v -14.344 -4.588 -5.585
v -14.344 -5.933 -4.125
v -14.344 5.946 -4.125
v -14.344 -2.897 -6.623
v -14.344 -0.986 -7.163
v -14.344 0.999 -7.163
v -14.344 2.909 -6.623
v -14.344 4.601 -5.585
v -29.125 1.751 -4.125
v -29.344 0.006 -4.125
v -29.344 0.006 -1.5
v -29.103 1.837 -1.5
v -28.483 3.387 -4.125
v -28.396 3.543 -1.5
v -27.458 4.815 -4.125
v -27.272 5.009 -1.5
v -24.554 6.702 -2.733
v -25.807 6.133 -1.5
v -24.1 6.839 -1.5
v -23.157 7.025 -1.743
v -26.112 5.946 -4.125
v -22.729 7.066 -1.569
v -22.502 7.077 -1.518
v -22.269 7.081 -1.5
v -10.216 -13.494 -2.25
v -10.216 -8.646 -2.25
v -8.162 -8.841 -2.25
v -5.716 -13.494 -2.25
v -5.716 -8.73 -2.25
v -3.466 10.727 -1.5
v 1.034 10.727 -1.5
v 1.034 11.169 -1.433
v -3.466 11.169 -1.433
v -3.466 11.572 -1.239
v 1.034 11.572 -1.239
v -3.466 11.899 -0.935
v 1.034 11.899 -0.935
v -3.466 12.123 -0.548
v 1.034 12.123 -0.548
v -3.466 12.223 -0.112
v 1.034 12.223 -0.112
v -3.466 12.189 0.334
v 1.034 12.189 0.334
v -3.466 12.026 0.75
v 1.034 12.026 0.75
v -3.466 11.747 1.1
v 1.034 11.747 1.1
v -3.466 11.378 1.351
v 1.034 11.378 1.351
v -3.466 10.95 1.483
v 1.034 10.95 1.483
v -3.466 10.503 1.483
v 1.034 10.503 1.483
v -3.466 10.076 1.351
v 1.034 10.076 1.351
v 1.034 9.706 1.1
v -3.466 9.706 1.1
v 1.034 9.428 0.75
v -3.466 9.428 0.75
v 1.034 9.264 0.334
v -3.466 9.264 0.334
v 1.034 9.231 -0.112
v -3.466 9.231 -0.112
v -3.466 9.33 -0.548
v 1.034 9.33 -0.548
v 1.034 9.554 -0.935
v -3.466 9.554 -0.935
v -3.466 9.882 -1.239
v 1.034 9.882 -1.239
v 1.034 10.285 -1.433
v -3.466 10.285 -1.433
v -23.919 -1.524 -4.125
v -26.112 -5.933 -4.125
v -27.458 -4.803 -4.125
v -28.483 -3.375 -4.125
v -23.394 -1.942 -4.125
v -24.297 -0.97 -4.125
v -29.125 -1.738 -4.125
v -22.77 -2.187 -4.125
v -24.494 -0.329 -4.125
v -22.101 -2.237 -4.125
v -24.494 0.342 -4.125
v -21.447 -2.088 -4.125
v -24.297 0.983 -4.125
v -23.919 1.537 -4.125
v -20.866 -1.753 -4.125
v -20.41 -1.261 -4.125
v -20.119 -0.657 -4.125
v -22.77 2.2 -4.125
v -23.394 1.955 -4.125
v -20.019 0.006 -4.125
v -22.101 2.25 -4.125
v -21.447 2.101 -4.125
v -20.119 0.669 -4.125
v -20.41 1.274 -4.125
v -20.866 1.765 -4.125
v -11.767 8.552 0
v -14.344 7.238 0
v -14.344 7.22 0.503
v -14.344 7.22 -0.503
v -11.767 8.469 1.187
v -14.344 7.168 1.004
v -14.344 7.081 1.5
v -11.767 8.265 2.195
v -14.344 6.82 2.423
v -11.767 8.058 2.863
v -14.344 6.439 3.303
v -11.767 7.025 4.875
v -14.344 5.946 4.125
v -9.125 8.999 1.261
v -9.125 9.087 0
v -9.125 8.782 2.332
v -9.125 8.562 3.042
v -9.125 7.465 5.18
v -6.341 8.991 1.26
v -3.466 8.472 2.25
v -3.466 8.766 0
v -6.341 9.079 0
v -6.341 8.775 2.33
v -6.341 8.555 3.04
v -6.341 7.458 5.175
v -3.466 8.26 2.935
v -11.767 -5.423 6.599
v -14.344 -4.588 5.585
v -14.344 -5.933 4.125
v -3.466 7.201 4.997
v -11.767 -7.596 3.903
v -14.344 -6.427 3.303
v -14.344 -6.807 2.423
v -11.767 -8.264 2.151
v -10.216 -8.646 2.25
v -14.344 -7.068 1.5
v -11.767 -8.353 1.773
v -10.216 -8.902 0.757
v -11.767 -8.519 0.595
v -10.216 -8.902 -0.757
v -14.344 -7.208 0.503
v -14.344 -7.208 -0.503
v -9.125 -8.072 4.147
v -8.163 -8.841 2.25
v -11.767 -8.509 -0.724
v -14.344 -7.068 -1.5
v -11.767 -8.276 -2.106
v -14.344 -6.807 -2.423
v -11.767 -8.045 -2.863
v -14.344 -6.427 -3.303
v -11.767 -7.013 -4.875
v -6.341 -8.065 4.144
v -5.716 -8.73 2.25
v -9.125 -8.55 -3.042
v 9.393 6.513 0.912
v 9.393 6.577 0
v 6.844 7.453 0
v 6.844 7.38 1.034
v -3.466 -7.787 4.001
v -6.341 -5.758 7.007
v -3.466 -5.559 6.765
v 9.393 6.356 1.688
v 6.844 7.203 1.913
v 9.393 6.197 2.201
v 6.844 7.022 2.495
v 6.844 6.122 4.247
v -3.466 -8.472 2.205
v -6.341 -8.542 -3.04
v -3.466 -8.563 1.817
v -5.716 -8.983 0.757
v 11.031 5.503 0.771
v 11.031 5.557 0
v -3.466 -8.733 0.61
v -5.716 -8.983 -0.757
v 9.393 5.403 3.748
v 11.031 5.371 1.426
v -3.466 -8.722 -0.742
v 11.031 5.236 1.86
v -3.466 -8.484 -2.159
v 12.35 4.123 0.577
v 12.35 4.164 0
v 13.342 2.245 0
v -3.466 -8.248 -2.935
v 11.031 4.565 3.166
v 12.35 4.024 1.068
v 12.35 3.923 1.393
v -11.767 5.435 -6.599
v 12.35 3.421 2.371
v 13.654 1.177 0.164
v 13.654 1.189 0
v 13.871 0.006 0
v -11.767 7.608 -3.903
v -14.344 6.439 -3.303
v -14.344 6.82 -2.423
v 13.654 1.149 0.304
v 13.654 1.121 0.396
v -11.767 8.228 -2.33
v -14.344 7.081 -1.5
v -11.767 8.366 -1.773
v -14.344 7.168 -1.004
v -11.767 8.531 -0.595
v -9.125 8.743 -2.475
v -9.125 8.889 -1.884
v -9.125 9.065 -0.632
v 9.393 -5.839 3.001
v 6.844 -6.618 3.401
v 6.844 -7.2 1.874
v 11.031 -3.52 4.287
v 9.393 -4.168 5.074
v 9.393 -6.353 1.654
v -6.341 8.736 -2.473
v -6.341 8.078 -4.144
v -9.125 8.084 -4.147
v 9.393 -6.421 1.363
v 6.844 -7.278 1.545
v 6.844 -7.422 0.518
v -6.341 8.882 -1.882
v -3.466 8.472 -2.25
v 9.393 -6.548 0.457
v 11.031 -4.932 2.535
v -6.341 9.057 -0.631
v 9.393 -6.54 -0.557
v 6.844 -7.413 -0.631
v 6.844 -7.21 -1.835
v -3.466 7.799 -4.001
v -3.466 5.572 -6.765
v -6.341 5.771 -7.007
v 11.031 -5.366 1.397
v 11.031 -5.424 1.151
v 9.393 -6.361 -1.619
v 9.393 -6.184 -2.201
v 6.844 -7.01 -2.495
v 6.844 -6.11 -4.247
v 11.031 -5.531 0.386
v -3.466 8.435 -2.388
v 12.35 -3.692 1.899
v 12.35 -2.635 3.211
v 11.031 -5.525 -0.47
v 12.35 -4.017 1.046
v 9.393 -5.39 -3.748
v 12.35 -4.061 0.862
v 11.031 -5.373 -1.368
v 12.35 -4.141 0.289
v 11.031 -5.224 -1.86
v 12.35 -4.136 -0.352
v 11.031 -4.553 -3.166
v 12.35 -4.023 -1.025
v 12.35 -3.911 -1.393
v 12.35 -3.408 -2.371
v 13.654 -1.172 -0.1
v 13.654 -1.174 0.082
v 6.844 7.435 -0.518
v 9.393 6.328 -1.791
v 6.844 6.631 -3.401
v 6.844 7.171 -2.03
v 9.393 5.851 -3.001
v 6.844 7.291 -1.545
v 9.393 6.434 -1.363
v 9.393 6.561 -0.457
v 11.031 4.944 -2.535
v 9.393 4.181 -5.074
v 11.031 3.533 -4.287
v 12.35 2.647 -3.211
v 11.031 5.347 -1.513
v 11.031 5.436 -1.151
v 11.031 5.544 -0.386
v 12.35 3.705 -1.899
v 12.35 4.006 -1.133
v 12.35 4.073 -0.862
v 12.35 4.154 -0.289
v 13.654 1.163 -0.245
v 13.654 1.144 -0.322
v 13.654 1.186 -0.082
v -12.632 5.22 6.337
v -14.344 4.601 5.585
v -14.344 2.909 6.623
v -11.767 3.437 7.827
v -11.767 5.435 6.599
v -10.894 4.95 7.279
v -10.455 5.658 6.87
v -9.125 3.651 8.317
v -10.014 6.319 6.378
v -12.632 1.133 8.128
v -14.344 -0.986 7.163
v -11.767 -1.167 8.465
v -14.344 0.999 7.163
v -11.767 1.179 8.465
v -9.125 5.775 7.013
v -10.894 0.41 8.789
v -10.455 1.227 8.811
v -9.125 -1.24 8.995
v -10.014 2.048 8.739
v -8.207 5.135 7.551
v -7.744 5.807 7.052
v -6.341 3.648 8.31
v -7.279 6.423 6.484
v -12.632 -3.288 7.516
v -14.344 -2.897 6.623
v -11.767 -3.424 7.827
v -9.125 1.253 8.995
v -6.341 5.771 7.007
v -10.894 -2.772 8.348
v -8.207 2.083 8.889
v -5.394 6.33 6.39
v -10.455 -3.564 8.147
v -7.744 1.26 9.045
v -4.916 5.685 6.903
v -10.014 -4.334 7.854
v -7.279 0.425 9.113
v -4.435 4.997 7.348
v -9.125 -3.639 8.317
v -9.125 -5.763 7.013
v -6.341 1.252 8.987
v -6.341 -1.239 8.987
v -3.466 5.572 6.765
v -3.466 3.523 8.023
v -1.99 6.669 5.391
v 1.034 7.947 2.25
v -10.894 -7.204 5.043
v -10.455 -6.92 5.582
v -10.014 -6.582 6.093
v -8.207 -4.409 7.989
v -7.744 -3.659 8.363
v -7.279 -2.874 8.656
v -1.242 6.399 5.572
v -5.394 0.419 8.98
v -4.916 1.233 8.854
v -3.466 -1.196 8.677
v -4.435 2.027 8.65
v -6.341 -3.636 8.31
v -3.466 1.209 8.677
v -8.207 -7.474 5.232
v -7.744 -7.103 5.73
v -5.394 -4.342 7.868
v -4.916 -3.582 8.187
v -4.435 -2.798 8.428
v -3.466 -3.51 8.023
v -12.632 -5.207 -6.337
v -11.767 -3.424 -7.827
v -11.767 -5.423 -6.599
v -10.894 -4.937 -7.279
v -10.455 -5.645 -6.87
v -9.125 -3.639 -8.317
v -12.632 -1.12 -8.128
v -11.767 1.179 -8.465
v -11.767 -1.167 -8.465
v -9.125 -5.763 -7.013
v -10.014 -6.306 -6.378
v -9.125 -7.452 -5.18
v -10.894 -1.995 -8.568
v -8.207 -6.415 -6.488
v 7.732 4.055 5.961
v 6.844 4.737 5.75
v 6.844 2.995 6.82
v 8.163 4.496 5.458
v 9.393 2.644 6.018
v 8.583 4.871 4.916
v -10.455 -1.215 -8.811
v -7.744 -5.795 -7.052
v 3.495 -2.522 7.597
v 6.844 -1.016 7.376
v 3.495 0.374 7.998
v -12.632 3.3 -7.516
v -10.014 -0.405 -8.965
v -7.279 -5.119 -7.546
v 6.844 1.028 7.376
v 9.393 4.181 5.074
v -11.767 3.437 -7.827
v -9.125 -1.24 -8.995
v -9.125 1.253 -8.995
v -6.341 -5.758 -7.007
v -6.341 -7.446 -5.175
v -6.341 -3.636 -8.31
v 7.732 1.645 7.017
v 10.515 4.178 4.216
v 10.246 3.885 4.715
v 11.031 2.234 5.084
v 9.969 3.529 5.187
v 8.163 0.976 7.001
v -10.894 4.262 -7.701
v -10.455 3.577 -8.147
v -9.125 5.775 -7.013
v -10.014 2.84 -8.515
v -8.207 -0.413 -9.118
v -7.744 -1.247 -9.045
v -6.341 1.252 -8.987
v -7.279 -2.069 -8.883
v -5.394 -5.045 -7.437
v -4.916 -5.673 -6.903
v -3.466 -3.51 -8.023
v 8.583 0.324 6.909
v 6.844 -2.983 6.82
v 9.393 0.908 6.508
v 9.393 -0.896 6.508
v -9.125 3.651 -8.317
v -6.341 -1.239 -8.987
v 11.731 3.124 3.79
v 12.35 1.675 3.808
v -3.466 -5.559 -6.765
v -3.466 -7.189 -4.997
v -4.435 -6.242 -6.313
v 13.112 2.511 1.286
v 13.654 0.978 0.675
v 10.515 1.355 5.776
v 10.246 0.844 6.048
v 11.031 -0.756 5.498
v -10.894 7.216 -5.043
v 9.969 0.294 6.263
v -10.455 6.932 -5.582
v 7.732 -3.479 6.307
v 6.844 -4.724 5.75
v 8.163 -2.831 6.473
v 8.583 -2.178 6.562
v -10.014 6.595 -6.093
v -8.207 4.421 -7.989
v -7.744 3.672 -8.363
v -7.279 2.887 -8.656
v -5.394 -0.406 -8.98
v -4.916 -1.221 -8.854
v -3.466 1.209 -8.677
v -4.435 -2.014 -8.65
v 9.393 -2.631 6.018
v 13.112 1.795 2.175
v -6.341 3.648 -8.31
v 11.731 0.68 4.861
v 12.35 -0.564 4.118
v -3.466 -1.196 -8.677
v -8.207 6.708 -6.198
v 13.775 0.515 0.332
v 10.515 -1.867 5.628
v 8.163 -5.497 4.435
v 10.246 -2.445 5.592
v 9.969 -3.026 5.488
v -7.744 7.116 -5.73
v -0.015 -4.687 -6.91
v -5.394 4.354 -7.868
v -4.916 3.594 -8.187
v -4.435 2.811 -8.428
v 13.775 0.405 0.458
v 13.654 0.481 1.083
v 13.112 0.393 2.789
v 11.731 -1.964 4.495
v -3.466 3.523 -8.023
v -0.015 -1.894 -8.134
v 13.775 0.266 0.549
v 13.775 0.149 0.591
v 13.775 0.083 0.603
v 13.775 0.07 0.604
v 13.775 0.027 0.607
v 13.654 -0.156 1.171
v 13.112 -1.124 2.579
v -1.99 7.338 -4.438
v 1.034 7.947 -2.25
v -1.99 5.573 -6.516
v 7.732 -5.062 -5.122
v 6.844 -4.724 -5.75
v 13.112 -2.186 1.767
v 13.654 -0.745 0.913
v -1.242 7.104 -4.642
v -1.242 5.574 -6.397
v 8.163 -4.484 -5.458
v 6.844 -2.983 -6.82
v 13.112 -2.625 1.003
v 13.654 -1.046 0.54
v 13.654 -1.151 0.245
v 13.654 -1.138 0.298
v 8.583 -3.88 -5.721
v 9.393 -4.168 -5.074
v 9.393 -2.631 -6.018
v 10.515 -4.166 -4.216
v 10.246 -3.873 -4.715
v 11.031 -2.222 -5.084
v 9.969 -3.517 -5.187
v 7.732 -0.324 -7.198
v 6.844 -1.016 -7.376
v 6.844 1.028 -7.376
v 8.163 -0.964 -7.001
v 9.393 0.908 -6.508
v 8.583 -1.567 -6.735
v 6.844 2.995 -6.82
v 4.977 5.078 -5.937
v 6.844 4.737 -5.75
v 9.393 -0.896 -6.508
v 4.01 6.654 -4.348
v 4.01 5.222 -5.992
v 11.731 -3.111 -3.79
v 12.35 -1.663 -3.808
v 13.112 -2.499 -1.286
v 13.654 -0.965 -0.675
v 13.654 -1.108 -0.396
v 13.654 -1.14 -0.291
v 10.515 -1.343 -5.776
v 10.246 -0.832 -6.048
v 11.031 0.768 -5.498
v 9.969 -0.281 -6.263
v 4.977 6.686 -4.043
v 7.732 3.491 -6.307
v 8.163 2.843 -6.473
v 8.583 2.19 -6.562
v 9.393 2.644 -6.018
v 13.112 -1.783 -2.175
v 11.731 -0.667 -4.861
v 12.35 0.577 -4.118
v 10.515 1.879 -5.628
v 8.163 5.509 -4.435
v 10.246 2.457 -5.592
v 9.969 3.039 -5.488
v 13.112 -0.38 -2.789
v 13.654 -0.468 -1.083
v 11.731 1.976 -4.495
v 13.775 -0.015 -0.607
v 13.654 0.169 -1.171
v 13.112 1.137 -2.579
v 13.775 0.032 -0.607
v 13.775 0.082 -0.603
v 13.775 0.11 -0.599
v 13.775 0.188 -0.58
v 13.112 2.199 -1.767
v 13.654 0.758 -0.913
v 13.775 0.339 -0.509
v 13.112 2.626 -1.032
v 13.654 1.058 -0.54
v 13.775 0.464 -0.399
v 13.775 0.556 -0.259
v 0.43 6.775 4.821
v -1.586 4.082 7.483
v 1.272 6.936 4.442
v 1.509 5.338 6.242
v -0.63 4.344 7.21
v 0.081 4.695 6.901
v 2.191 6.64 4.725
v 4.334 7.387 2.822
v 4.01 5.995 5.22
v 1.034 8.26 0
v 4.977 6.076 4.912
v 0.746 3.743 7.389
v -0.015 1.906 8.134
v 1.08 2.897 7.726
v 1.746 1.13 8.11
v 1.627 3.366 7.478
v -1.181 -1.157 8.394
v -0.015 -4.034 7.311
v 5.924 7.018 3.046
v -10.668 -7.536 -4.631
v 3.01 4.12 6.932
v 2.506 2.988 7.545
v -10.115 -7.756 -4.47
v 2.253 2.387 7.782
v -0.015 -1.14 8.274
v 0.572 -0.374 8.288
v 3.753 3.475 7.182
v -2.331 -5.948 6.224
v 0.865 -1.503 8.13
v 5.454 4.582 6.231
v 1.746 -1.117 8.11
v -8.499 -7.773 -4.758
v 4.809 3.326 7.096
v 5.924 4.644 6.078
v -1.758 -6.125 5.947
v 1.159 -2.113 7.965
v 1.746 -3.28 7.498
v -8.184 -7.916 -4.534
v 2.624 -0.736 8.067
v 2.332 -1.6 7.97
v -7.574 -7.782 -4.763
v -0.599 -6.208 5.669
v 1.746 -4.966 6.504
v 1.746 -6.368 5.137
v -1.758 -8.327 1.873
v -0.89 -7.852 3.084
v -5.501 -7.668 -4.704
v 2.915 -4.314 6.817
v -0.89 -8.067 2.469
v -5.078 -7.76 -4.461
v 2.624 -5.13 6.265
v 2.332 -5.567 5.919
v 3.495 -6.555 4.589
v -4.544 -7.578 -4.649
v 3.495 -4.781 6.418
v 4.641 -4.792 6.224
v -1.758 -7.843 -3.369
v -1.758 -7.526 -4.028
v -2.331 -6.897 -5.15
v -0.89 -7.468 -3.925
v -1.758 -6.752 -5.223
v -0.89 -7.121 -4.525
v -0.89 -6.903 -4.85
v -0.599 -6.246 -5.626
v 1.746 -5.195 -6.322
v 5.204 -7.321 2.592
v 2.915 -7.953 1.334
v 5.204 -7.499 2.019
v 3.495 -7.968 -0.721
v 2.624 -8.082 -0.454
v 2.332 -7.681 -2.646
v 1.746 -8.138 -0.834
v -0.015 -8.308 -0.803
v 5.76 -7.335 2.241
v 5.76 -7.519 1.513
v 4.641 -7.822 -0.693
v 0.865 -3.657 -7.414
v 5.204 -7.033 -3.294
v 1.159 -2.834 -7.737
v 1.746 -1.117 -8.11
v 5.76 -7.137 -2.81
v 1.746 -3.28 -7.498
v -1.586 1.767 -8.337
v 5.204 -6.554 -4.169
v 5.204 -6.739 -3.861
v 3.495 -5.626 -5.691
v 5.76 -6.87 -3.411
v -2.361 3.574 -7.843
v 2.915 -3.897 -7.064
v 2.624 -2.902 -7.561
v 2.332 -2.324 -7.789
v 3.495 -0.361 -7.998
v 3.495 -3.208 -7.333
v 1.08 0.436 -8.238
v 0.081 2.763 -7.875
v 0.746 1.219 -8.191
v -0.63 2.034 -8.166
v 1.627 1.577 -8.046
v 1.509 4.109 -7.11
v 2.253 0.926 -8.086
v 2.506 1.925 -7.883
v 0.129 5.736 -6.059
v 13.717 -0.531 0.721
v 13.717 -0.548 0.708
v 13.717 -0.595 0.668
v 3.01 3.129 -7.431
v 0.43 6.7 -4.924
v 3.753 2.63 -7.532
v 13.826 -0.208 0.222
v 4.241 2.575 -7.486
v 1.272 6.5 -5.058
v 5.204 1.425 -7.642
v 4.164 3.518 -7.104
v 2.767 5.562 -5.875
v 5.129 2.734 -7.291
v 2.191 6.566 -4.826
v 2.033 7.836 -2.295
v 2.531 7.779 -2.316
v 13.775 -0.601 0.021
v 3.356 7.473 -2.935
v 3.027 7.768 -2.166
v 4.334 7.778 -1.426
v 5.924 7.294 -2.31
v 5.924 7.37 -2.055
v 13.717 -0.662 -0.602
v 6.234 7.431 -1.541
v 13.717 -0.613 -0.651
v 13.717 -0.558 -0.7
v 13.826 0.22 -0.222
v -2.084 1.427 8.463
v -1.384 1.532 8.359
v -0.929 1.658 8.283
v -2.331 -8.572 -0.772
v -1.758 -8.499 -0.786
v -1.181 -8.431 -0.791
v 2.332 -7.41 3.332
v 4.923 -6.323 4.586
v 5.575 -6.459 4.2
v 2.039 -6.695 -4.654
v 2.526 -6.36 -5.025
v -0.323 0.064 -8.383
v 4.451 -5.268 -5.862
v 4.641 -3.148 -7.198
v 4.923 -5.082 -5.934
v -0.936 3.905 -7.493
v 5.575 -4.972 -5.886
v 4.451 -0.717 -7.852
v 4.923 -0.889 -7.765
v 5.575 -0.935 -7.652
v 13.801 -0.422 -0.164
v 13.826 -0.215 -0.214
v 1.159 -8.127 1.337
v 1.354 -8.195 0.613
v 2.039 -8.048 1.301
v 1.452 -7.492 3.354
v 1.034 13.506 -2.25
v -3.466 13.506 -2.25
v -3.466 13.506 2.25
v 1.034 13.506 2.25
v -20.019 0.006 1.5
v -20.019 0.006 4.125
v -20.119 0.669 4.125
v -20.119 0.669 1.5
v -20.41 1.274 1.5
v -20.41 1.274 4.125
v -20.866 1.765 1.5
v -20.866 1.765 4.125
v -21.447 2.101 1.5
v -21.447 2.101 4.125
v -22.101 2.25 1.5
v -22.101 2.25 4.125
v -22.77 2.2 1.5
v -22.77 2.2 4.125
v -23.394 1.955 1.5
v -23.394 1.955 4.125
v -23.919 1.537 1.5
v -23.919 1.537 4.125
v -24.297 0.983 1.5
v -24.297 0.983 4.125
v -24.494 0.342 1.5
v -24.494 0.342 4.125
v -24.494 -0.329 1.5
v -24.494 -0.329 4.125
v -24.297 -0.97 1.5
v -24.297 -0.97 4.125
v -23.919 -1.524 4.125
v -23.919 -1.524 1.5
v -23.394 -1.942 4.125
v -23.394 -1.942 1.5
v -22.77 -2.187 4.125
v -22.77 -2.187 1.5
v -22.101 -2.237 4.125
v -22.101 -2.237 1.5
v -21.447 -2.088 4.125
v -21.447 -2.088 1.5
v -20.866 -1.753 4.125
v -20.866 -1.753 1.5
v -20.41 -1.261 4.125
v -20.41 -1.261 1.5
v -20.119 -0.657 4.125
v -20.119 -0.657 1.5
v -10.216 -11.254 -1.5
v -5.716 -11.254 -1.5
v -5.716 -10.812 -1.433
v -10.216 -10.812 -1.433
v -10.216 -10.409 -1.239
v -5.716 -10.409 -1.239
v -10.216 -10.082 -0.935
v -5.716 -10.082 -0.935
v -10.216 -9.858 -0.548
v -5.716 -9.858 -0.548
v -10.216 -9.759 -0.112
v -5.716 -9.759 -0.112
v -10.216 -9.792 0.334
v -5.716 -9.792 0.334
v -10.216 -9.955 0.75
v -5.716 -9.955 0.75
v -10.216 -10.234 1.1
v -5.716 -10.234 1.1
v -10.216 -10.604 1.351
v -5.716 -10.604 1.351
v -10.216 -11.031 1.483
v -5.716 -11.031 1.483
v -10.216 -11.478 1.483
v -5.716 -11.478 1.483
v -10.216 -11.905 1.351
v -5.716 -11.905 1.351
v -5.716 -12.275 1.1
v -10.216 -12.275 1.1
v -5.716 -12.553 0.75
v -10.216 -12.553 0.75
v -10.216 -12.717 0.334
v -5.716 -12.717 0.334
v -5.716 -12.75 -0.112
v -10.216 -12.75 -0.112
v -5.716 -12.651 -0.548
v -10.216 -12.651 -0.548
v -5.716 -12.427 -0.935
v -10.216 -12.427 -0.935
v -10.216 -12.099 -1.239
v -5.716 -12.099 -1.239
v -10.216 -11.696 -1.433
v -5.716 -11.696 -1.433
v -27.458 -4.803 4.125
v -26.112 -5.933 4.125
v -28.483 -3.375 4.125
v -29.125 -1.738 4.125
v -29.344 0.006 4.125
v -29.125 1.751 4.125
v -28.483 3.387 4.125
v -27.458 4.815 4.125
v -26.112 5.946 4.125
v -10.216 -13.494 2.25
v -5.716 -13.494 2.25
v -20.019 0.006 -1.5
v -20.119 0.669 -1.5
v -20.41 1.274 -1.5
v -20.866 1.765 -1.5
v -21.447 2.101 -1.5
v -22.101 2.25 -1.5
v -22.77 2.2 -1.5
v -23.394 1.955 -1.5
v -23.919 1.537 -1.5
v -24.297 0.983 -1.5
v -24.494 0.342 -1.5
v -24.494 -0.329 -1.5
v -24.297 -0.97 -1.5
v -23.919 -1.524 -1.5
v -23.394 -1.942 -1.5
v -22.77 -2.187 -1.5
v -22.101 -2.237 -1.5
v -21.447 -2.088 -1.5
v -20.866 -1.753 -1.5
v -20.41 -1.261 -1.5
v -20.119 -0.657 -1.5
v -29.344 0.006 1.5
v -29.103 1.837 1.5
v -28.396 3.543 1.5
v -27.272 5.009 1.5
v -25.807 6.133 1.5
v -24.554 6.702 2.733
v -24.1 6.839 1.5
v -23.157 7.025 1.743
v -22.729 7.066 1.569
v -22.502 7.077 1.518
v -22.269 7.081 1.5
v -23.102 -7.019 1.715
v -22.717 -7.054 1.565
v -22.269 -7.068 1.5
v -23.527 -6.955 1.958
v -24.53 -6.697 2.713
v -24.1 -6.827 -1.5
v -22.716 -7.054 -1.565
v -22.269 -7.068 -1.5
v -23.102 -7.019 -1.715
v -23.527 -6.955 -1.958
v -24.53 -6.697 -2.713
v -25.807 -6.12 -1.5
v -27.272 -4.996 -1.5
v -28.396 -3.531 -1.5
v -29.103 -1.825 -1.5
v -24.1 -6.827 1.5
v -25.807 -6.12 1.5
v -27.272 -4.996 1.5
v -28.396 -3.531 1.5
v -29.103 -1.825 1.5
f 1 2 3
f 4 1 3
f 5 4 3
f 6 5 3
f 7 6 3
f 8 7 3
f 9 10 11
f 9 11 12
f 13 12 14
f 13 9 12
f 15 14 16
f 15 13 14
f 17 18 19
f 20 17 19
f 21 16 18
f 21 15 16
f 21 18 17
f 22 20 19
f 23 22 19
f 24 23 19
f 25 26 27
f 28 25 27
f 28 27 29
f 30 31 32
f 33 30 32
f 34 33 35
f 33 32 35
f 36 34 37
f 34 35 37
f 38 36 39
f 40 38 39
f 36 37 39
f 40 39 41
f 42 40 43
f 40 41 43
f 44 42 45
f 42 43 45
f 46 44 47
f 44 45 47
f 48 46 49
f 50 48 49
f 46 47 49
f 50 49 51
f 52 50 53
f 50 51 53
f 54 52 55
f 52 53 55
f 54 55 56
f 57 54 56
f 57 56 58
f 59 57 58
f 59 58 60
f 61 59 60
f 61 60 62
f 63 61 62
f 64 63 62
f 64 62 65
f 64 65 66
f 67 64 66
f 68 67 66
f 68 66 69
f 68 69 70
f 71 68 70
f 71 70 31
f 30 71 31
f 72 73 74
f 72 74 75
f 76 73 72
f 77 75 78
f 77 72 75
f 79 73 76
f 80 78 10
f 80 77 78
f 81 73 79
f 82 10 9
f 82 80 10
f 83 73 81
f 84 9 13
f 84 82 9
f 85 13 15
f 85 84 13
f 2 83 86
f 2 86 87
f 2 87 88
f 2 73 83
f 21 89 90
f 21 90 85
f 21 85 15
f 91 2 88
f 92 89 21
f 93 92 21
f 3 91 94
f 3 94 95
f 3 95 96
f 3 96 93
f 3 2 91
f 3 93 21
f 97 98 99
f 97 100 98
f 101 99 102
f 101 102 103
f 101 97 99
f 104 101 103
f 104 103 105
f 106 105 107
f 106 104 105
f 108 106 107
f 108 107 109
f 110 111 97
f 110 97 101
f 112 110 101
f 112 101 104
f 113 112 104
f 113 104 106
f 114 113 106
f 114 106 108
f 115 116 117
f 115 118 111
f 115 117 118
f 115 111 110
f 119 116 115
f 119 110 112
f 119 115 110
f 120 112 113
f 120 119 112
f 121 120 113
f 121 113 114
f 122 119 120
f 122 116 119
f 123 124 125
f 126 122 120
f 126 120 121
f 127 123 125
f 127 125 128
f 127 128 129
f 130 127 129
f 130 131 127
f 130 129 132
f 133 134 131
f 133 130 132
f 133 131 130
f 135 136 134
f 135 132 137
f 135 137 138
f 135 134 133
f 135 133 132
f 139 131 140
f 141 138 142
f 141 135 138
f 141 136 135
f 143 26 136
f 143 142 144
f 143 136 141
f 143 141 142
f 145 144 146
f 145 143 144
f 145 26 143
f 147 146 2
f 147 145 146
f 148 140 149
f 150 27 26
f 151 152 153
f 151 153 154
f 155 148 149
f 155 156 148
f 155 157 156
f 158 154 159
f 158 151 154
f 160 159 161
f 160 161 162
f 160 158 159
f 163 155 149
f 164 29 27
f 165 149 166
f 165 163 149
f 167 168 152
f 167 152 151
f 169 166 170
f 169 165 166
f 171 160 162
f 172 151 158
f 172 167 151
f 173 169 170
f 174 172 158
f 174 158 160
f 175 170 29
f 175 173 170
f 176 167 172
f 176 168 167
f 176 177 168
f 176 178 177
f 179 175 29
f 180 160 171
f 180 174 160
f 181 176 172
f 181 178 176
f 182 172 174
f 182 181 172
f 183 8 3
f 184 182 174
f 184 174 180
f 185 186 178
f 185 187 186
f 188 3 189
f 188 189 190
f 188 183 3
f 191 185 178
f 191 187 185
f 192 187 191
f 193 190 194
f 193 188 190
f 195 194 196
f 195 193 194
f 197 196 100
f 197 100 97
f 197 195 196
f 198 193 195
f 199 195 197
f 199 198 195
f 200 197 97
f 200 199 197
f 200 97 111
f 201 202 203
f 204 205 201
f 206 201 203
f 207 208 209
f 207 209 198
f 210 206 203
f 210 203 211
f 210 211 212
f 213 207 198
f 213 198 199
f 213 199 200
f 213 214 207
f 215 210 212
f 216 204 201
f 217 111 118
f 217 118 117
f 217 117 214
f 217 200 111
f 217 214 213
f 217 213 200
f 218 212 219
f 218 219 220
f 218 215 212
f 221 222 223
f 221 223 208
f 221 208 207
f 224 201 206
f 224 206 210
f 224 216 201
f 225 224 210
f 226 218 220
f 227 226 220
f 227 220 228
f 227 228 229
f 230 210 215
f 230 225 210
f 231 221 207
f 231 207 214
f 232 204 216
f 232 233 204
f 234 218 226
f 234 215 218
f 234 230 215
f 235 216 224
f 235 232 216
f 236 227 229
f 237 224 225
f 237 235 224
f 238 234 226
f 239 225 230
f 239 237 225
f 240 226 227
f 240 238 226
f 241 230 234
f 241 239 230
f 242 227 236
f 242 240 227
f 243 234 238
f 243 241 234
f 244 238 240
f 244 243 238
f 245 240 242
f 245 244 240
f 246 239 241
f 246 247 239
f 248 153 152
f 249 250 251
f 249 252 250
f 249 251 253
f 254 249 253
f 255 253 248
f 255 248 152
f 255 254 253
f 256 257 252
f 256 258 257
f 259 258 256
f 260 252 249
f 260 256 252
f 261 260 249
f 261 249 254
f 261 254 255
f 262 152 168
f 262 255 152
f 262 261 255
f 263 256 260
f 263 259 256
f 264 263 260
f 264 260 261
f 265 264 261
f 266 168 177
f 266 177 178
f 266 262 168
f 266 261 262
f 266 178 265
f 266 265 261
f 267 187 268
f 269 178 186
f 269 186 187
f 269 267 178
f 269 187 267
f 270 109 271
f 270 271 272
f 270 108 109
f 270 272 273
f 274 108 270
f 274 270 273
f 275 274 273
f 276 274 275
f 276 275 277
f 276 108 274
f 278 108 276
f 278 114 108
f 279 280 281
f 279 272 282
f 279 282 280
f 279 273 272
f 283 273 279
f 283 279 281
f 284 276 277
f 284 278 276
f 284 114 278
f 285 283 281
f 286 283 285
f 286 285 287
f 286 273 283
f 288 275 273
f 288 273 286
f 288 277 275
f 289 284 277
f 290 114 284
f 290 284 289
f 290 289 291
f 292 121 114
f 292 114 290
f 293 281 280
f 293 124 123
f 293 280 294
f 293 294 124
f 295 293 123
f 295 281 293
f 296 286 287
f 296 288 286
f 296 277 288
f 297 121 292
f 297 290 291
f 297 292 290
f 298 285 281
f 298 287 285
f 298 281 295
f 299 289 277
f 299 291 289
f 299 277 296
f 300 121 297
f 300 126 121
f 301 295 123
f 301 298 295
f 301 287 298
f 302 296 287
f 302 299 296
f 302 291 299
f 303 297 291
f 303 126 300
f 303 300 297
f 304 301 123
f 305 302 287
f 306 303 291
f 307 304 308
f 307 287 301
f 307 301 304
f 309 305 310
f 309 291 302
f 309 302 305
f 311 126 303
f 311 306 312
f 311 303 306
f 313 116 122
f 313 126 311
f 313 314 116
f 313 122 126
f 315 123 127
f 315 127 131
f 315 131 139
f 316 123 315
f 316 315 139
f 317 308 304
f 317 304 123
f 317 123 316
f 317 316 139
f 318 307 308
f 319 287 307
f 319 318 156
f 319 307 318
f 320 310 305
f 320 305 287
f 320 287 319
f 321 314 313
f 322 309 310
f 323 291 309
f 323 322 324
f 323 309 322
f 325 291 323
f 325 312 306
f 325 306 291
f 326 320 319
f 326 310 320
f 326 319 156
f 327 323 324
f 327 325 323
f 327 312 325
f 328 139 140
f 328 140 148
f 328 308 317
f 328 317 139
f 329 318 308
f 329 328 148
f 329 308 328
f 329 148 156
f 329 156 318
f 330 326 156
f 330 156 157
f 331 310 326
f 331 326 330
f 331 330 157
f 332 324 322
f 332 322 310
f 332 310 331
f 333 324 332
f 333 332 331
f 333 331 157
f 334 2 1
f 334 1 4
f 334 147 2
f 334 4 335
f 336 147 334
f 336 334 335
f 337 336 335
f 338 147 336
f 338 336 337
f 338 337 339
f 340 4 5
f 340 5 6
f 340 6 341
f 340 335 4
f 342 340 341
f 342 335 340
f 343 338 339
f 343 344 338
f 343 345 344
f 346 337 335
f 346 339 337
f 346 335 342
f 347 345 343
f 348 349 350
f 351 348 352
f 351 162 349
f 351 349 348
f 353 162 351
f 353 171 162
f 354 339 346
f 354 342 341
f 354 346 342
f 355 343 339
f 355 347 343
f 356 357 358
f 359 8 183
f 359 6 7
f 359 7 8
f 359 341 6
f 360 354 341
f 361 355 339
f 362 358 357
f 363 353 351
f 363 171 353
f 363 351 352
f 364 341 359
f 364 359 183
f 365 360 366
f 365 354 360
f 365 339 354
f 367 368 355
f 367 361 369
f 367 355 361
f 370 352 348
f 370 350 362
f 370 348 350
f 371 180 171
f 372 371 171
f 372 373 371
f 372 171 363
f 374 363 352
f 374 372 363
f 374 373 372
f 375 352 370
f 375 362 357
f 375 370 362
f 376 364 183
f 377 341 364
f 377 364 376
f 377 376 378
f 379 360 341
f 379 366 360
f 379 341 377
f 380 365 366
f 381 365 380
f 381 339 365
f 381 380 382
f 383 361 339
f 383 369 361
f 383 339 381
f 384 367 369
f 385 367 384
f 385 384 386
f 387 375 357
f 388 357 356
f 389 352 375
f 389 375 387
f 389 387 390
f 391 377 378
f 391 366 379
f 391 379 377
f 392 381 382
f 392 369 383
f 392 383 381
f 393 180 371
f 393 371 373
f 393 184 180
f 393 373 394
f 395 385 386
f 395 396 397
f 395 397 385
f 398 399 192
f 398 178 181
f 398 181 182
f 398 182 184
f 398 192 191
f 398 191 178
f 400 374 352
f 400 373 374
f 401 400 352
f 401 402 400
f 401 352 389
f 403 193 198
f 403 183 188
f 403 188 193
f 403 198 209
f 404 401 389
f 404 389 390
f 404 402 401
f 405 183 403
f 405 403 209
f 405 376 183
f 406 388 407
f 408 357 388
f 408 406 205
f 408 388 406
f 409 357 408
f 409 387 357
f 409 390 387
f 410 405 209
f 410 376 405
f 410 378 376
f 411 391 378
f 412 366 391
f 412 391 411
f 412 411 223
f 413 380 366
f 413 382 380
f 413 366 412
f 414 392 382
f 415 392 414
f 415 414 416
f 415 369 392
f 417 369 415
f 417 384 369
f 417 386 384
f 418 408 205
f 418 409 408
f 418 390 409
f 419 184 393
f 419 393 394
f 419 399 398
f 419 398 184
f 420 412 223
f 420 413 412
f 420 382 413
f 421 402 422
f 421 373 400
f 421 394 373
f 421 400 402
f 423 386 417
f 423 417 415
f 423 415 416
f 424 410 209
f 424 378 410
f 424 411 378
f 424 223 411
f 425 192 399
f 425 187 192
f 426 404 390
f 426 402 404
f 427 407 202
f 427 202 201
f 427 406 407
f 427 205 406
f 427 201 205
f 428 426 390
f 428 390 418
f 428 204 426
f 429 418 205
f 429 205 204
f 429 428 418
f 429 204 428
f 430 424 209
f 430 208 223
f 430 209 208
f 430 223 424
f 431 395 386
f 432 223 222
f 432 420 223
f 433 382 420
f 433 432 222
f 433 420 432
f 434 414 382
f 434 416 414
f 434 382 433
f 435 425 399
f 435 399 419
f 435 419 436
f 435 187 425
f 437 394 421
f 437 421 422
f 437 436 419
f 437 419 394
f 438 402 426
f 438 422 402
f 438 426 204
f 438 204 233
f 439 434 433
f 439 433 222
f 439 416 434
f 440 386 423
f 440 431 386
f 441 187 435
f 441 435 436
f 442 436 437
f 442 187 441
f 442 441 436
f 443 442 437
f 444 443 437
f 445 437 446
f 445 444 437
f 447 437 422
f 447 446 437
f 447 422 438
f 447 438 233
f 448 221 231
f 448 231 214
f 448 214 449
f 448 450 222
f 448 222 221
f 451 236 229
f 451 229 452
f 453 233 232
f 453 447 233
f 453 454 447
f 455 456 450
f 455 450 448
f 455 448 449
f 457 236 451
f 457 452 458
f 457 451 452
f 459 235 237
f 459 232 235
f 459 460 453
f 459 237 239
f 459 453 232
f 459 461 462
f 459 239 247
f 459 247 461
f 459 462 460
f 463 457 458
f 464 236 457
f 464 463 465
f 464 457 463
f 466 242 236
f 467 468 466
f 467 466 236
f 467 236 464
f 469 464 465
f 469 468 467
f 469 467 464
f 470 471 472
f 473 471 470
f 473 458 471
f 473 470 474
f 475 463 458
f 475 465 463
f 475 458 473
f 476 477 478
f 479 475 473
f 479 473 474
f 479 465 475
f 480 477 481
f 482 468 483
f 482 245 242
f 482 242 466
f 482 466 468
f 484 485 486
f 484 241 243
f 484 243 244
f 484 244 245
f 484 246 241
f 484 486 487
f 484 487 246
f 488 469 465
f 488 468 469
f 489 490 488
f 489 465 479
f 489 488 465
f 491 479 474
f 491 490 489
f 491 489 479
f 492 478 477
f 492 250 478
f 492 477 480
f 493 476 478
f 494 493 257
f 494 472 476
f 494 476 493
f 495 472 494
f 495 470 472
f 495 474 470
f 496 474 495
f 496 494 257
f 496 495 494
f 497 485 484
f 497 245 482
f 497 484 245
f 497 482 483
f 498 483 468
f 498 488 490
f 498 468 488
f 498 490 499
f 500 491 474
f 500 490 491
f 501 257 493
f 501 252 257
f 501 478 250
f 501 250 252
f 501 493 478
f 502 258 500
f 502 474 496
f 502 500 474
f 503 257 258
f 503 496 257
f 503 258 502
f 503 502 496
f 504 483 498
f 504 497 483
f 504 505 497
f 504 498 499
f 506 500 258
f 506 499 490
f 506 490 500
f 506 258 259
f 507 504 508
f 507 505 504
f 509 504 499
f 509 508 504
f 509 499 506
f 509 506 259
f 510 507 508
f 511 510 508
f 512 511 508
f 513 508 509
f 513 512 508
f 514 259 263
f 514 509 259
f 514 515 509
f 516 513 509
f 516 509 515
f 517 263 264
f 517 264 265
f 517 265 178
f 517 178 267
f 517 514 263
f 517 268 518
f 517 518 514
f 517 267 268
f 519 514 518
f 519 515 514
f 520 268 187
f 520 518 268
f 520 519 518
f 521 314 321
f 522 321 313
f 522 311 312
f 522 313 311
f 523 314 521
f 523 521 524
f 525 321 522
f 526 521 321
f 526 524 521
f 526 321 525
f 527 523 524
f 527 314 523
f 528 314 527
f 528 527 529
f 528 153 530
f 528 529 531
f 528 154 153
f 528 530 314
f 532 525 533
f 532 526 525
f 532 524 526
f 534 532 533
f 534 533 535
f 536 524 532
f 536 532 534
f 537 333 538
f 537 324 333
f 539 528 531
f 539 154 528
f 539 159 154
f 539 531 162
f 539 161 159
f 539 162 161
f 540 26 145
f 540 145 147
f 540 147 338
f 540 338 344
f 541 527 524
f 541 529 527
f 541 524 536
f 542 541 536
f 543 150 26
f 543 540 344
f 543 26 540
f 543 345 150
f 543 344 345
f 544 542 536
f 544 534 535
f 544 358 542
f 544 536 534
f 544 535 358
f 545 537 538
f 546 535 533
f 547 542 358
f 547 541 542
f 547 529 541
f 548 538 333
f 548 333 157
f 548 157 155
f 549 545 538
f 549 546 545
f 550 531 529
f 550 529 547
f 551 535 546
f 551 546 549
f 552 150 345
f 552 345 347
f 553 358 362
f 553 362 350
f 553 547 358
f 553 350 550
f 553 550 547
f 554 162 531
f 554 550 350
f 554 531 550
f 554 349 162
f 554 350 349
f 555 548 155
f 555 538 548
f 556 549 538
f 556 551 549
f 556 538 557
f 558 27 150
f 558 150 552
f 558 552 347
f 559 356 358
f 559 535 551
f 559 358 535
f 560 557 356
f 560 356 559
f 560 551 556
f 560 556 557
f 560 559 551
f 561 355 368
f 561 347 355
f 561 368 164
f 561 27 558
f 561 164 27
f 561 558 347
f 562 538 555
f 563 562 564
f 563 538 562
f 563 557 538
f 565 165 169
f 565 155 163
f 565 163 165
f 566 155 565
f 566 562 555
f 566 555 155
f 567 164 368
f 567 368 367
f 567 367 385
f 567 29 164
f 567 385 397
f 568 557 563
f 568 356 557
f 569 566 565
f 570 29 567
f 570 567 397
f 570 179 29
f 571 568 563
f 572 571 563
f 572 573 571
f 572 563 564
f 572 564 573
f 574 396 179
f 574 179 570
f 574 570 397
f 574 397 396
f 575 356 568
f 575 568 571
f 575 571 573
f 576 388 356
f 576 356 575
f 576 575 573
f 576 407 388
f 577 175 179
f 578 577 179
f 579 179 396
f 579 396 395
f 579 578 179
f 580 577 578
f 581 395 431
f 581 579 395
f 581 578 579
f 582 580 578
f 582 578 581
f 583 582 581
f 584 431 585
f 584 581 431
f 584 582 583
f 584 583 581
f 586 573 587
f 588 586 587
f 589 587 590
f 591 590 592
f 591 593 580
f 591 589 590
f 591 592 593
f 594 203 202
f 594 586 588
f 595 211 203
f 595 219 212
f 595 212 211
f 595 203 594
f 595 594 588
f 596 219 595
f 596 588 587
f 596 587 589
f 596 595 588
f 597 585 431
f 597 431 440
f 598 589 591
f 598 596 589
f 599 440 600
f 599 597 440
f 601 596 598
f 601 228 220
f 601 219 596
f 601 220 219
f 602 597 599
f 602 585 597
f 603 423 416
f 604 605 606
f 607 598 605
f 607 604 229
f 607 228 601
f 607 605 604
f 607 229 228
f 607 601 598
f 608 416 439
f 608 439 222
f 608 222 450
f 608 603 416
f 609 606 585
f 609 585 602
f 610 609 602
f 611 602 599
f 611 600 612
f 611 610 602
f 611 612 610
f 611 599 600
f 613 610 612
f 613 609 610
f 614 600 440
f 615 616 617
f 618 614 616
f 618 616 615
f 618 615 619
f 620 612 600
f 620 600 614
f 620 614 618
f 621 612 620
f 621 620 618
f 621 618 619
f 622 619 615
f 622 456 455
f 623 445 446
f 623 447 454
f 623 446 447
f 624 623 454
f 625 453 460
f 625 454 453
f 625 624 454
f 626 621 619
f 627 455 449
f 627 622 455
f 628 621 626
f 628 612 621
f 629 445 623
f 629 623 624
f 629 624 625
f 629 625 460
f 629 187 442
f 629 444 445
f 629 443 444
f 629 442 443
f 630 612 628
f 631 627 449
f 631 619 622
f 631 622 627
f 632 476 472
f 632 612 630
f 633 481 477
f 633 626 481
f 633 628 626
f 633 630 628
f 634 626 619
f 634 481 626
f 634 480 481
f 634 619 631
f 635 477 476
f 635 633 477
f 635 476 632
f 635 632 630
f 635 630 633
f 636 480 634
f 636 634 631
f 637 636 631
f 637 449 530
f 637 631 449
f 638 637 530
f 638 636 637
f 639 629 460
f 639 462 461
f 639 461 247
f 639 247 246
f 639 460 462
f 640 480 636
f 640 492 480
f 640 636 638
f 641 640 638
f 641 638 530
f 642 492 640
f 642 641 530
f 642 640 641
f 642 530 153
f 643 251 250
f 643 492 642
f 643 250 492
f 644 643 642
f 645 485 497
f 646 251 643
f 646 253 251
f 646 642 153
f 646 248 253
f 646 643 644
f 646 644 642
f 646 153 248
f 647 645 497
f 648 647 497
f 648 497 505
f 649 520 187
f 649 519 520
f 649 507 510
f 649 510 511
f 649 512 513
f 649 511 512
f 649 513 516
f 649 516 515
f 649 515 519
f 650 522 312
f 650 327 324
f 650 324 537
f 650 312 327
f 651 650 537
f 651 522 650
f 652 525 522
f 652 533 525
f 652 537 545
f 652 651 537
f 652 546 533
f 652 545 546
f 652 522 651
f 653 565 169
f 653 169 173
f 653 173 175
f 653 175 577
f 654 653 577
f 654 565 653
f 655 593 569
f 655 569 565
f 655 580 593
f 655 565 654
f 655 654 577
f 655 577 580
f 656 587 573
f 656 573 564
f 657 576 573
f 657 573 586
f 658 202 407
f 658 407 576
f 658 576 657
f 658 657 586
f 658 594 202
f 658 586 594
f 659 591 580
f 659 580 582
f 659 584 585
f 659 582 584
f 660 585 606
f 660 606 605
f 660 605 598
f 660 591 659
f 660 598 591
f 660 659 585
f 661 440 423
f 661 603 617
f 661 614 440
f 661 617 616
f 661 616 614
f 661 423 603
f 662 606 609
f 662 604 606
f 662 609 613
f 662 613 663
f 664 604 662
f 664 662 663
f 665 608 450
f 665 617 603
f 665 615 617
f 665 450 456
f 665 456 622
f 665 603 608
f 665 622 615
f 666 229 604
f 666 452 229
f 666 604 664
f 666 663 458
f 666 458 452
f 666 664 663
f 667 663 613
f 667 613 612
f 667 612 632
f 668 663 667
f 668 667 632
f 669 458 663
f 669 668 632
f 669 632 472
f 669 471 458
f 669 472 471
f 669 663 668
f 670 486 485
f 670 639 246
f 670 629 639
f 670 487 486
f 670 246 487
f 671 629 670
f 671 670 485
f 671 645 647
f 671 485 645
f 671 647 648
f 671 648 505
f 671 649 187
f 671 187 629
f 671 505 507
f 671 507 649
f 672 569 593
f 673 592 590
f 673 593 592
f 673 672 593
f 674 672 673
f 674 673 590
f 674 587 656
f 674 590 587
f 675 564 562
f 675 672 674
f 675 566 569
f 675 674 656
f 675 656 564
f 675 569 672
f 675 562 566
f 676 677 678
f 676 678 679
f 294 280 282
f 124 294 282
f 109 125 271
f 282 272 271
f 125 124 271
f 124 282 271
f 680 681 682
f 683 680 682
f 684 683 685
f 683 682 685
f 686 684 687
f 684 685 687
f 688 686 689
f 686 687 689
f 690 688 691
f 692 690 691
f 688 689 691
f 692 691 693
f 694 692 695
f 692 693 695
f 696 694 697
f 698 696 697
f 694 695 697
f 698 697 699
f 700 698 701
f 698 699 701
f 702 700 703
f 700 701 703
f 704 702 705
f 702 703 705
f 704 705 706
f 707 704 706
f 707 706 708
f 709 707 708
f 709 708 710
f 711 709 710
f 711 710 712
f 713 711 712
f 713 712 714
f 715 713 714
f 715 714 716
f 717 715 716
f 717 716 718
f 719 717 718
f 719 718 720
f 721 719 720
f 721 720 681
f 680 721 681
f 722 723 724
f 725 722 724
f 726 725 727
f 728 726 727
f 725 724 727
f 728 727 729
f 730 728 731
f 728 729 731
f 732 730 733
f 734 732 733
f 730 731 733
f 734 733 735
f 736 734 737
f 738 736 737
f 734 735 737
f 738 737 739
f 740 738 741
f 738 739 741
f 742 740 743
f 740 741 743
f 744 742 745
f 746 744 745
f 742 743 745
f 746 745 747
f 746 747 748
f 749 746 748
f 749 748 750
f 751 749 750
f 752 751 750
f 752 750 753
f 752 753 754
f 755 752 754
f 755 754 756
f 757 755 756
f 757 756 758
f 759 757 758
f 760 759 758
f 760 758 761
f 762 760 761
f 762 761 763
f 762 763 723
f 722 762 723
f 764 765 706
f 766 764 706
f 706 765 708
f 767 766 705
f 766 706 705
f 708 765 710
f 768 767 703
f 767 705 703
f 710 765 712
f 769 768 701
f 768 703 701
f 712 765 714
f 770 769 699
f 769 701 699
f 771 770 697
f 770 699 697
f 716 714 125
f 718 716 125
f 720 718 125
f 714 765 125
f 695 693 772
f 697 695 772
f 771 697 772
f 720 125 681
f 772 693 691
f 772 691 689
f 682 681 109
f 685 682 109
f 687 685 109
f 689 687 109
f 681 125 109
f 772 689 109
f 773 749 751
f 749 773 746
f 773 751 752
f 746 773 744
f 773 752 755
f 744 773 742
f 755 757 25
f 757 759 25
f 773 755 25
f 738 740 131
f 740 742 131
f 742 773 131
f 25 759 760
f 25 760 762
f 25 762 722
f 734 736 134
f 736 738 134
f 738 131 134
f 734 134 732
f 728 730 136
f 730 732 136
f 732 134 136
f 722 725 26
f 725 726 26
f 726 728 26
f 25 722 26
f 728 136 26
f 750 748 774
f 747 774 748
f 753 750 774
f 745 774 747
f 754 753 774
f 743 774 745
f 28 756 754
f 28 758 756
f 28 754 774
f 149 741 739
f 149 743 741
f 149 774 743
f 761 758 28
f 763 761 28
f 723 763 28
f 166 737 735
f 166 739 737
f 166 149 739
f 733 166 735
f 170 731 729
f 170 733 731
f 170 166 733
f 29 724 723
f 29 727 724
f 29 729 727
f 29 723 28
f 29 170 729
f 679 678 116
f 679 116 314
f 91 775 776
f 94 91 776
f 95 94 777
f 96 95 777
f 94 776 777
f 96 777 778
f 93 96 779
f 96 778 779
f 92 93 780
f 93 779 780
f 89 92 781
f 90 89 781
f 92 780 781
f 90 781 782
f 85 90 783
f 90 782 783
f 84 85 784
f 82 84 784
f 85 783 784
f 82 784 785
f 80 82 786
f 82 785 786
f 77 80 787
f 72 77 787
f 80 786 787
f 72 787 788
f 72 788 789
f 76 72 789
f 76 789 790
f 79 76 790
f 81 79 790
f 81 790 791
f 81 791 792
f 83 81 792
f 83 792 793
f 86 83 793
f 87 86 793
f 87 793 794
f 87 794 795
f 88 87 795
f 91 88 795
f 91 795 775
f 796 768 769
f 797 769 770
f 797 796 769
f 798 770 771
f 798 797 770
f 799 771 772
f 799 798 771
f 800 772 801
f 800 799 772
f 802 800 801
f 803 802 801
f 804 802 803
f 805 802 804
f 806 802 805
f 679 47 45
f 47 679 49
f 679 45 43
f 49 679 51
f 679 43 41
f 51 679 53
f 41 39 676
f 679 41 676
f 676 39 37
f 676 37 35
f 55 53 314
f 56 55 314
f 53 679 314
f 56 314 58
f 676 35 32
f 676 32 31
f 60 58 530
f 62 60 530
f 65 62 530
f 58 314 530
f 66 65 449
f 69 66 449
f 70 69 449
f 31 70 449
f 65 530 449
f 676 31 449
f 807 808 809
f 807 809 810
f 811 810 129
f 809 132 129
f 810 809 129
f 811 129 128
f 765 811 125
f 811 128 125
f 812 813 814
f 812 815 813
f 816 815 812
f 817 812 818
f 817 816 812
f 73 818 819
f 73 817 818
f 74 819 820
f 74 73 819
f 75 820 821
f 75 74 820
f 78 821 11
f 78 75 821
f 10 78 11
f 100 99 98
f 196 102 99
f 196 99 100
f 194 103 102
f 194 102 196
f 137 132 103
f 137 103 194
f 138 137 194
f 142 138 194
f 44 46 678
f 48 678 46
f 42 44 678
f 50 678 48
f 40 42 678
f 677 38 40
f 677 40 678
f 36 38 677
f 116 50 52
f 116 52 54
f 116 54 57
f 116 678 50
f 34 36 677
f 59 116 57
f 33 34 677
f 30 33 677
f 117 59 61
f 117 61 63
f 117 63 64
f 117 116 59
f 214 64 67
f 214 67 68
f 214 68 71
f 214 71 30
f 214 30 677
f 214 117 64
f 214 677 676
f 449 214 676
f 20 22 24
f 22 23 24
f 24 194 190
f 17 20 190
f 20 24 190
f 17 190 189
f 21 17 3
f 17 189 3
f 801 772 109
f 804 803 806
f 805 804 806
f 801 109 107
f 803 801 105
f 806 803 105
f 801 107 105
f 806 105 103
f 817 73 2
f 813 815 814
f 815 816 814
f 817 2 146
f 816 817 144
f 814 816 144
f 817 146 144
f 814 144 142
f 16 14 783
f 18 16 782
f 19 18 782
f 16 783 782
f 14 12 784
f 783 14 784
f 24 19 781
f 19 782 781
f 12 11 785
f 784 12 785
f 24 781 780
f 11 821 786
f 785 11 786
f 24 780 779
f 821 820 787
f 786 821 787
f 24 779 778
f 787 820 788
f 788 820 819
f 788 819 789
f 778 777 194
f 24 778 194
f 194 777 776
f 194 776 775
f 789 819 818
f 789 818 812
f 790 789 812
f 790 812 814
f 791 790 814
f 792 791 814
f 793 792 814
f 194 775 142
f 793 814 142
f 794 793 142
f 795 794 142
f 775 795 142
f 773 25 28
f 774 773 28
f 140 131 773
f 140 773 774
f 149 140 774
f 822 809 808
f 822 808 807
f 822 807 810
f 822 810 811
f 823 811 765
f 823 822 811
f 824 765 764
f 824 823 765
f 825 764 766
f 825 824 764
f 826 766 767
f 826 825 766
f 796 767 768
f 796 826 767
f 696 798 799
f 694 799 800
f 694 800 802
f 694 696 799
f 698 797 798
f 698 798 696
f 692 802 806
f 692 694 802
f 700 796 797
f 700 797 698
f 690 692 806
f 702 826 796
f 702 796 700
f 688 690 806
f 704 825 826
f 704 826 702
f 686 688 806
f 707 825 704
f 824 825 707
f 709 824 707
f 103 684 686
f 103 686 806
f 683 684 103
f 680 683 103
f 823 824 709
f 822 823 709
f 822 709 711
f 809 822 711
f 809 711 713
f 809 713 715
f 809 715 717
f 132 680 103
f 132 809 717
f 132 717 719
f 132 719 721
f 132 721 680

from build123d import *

# Parameters (mm, degrees)
SKETCH2_W               = 11
SKETCH2_H               = 20
BOSS_EXTRUDE1_DEPTH     = 20
SKETCH3_R               = 15
SKETCH3_R_2             = 9.642090149
CUT_EXTRUDE1_DEPTH      = 42.372377867
CUT_EXTRUDE2_DEPTH      = 42.267785166
CUT_EXTRUDE2_DEPTH_BACK = 42.267785166
SKETCH4_W               = 20
SKETCH4_H               = 4
CUT_EXTRUDE3_DEPTH      = 42.901456055
CUT_EXTRUDE3_DEPTH_BACK = 42.901456055
SKETCH7_R               = 3
CUT_EXTRUDE4_DEPTH      = 44.211230012
SKETCH10_W              = 6
SKETCH10_H              = 6
BOSS_EXTRUDE3_DEPTH     = 18
SKETCH11_R              = 2
CUT_EXTRUDE6_DEPTH      = 39.271928202
SKETCH8_W               = 6
SKETCH8_H               = 6
BOSS_EXTRUDE4_DEPTH     = 18
SKETCH12_R              = 2
CUT_EXTRUDE7_DEPTH      = 46.965327997
SCALE1_SCALE            = 0.75


with BuildPart() as part:
    # Sketch1 → Revolve1 (revolve)
    with BuildSketch(Plane.XY):
        with BuildLine():
            Line((-17.503938211, 9.642090149), (-17.503938211, 0))
            Line((-17.503938211, 0), (20.115058741, 0))
            add(Edge.make_bspline(
                [(-17.503938211, 9.642090149), (-12.037965172, 13.468024809), (1.720669261, 9.986942396), (18.674857326, 10.7604322), (20.115058741, 0)],
                knots=[0, 0, 0, 0, 0.417251545, 1, 1, 1, 1], degree=3))
        make_face()
    revolve(axis=Axis((-34.275157211, 0, 0), (1, 0, 0)))

    # Sketch2 → Boss-Extrude1 (add)
    with BuildSketch(Plane.ZY.offset(17.503938211)):
        Rectangle(SKETCH2_W, SKETCH2_H)
    extrude(amount=BOSS_EXTRUDE1_DEPTH)

    # Sketch3 → Cut-Extrude1 (cut, through all)
    with BuildSketch(Plane.ZY.offset(17.503938211)):
        Circle(SKETCH3_R)
        Circle(SKETCH3_R_2, mode=Mode.SUBTRACT)
    extrude(amount=CUT_EXTRUDE1_DEPTH, mode=Mode.SUBTRACT)

    # Sketch4 → Cut-Extrude2 (cut, two sides: drawn at the far end of the back side and taken through both)
    with BuildSketch(Plane(origin=(0, 0, 0), x_dir=(1, 0, 0), z_dir=(0, 1, 0)).offset(-CUT_EXTRUDE2_DEPTH_BACK)):
        with Locations((-27.503938211, 0)):
            Rectangle(SKETCH4_W, SKETCH4_H)
    extrude(amount=CUT_EXTRUDE2_DEPTH + CUT_EXTRUDE2_DEPTH_BACK, mode=Mode.SUBTRACT)

    # Sketch6 → Cut-Extrude3 (cut, two sides: drawn at the far end of the back side and taken through both)
    with BuildSketch(Plane.XY.offset(-2).offset(-CUT_EXTRUDE3_DEPTH_BACK)):
        with BuildLine():
            Line((-37.503938211, -9.43238583), (-28.071552381, -9.43238583))
            ThreePointArc((-28.071552381, -9.43238583), (-34.741256364, -6.669703983), (-37.503938211, 0))
            Line((-37.503938211, 0), (-37.503938211, -9.43238583))
        make_face()
        with BuildLine():
            Line((-37.503938211, 9.43238583), (-37.503938211, 0))
            ThreePointArc((-37.503938211, 0), (-34.741256364, 6.669703983), (-28.071552381, 9.43238583))
            Line((-28.071552381, 9.43238583), (-37.503938211, 9.43238583))
        make_face()
    extrude(amount=CUT_EXTRUDE3_DEPTH + CUT_EXTRUDE3_DEPTH_BACK, mode=Mode.SUBTRACT)

    # Sketch7 → Cut-Extrude4 (cut, through all)
    with BuildSketch(Plane.XY.offset(5.5)):
        with Locations((-28.071552381, 0)):
            Circle(SKETCH7_R)
    extrude(amount=-CUT_EXTRUDE4_DEPTH, mode=Mode.SUBTRACT)

    # Sketch10 → Boss-Extrude3 (add)
    with BuildSketch(Plane(origin=(0, 0, 0), x_dir=(1, 0, 0), z_dir=(0, 1, 0))):
        with Locations((-9, 0)):
            Rectangle(SKETCH10_W, SKETCH10_H)
    extrude(amount=-BOSS_EXTRUDE3_DEPTH)

    # Sketch11 → Cut-Extrude6 (cut, through all)
    with BuildSketch(Plane(origin=(-6, 0, 0), x_dir=(0, 0, -1), z_dir=(1, 0, 0))):
        with Locations((0, -15.01416918)):
            Circle(SKETCH11_R)
    extrude(amount=-CUT_EXTRUDE6_DEPTH, mode=Mode.SUBTRACT)

    # Sketch8 → Boss-Extrude4 (add)
    with BuildSketch(Plane(origin=(0, 0, 0), x_dir=(1, 0, 0), z_dir=(0, 1, 0))):
        Rectangle(SKETCH8_W, SKETCH8_H)
    extrude(amount=BOSS_EXTRUDE4_DEPTH)

    # Sketch12 → Cut-Extrude7 (cut, through all)
    with BuildSketch(Plane(origin=(3, 0, 0), x_dir=(0, 0, -1), z_dir=(1, 0, 0))):
        with Locations((0, 14.293955788)):
            Circle(SKETCH12_R)
    extrude(amount=-CUT_EXTRUDE7_DEPTH, mode=Mode.SUBTRACT)


with BuildPart() as part_1:
    # Scale1: scaled about (-4.862736276, 0.025056195, 1.7e-08)
    add(part.part.scale(SCALE1_SCALE).moved(Location((-1.215684069, 0.006264049, 4e-09))))


solid = part_1.part
